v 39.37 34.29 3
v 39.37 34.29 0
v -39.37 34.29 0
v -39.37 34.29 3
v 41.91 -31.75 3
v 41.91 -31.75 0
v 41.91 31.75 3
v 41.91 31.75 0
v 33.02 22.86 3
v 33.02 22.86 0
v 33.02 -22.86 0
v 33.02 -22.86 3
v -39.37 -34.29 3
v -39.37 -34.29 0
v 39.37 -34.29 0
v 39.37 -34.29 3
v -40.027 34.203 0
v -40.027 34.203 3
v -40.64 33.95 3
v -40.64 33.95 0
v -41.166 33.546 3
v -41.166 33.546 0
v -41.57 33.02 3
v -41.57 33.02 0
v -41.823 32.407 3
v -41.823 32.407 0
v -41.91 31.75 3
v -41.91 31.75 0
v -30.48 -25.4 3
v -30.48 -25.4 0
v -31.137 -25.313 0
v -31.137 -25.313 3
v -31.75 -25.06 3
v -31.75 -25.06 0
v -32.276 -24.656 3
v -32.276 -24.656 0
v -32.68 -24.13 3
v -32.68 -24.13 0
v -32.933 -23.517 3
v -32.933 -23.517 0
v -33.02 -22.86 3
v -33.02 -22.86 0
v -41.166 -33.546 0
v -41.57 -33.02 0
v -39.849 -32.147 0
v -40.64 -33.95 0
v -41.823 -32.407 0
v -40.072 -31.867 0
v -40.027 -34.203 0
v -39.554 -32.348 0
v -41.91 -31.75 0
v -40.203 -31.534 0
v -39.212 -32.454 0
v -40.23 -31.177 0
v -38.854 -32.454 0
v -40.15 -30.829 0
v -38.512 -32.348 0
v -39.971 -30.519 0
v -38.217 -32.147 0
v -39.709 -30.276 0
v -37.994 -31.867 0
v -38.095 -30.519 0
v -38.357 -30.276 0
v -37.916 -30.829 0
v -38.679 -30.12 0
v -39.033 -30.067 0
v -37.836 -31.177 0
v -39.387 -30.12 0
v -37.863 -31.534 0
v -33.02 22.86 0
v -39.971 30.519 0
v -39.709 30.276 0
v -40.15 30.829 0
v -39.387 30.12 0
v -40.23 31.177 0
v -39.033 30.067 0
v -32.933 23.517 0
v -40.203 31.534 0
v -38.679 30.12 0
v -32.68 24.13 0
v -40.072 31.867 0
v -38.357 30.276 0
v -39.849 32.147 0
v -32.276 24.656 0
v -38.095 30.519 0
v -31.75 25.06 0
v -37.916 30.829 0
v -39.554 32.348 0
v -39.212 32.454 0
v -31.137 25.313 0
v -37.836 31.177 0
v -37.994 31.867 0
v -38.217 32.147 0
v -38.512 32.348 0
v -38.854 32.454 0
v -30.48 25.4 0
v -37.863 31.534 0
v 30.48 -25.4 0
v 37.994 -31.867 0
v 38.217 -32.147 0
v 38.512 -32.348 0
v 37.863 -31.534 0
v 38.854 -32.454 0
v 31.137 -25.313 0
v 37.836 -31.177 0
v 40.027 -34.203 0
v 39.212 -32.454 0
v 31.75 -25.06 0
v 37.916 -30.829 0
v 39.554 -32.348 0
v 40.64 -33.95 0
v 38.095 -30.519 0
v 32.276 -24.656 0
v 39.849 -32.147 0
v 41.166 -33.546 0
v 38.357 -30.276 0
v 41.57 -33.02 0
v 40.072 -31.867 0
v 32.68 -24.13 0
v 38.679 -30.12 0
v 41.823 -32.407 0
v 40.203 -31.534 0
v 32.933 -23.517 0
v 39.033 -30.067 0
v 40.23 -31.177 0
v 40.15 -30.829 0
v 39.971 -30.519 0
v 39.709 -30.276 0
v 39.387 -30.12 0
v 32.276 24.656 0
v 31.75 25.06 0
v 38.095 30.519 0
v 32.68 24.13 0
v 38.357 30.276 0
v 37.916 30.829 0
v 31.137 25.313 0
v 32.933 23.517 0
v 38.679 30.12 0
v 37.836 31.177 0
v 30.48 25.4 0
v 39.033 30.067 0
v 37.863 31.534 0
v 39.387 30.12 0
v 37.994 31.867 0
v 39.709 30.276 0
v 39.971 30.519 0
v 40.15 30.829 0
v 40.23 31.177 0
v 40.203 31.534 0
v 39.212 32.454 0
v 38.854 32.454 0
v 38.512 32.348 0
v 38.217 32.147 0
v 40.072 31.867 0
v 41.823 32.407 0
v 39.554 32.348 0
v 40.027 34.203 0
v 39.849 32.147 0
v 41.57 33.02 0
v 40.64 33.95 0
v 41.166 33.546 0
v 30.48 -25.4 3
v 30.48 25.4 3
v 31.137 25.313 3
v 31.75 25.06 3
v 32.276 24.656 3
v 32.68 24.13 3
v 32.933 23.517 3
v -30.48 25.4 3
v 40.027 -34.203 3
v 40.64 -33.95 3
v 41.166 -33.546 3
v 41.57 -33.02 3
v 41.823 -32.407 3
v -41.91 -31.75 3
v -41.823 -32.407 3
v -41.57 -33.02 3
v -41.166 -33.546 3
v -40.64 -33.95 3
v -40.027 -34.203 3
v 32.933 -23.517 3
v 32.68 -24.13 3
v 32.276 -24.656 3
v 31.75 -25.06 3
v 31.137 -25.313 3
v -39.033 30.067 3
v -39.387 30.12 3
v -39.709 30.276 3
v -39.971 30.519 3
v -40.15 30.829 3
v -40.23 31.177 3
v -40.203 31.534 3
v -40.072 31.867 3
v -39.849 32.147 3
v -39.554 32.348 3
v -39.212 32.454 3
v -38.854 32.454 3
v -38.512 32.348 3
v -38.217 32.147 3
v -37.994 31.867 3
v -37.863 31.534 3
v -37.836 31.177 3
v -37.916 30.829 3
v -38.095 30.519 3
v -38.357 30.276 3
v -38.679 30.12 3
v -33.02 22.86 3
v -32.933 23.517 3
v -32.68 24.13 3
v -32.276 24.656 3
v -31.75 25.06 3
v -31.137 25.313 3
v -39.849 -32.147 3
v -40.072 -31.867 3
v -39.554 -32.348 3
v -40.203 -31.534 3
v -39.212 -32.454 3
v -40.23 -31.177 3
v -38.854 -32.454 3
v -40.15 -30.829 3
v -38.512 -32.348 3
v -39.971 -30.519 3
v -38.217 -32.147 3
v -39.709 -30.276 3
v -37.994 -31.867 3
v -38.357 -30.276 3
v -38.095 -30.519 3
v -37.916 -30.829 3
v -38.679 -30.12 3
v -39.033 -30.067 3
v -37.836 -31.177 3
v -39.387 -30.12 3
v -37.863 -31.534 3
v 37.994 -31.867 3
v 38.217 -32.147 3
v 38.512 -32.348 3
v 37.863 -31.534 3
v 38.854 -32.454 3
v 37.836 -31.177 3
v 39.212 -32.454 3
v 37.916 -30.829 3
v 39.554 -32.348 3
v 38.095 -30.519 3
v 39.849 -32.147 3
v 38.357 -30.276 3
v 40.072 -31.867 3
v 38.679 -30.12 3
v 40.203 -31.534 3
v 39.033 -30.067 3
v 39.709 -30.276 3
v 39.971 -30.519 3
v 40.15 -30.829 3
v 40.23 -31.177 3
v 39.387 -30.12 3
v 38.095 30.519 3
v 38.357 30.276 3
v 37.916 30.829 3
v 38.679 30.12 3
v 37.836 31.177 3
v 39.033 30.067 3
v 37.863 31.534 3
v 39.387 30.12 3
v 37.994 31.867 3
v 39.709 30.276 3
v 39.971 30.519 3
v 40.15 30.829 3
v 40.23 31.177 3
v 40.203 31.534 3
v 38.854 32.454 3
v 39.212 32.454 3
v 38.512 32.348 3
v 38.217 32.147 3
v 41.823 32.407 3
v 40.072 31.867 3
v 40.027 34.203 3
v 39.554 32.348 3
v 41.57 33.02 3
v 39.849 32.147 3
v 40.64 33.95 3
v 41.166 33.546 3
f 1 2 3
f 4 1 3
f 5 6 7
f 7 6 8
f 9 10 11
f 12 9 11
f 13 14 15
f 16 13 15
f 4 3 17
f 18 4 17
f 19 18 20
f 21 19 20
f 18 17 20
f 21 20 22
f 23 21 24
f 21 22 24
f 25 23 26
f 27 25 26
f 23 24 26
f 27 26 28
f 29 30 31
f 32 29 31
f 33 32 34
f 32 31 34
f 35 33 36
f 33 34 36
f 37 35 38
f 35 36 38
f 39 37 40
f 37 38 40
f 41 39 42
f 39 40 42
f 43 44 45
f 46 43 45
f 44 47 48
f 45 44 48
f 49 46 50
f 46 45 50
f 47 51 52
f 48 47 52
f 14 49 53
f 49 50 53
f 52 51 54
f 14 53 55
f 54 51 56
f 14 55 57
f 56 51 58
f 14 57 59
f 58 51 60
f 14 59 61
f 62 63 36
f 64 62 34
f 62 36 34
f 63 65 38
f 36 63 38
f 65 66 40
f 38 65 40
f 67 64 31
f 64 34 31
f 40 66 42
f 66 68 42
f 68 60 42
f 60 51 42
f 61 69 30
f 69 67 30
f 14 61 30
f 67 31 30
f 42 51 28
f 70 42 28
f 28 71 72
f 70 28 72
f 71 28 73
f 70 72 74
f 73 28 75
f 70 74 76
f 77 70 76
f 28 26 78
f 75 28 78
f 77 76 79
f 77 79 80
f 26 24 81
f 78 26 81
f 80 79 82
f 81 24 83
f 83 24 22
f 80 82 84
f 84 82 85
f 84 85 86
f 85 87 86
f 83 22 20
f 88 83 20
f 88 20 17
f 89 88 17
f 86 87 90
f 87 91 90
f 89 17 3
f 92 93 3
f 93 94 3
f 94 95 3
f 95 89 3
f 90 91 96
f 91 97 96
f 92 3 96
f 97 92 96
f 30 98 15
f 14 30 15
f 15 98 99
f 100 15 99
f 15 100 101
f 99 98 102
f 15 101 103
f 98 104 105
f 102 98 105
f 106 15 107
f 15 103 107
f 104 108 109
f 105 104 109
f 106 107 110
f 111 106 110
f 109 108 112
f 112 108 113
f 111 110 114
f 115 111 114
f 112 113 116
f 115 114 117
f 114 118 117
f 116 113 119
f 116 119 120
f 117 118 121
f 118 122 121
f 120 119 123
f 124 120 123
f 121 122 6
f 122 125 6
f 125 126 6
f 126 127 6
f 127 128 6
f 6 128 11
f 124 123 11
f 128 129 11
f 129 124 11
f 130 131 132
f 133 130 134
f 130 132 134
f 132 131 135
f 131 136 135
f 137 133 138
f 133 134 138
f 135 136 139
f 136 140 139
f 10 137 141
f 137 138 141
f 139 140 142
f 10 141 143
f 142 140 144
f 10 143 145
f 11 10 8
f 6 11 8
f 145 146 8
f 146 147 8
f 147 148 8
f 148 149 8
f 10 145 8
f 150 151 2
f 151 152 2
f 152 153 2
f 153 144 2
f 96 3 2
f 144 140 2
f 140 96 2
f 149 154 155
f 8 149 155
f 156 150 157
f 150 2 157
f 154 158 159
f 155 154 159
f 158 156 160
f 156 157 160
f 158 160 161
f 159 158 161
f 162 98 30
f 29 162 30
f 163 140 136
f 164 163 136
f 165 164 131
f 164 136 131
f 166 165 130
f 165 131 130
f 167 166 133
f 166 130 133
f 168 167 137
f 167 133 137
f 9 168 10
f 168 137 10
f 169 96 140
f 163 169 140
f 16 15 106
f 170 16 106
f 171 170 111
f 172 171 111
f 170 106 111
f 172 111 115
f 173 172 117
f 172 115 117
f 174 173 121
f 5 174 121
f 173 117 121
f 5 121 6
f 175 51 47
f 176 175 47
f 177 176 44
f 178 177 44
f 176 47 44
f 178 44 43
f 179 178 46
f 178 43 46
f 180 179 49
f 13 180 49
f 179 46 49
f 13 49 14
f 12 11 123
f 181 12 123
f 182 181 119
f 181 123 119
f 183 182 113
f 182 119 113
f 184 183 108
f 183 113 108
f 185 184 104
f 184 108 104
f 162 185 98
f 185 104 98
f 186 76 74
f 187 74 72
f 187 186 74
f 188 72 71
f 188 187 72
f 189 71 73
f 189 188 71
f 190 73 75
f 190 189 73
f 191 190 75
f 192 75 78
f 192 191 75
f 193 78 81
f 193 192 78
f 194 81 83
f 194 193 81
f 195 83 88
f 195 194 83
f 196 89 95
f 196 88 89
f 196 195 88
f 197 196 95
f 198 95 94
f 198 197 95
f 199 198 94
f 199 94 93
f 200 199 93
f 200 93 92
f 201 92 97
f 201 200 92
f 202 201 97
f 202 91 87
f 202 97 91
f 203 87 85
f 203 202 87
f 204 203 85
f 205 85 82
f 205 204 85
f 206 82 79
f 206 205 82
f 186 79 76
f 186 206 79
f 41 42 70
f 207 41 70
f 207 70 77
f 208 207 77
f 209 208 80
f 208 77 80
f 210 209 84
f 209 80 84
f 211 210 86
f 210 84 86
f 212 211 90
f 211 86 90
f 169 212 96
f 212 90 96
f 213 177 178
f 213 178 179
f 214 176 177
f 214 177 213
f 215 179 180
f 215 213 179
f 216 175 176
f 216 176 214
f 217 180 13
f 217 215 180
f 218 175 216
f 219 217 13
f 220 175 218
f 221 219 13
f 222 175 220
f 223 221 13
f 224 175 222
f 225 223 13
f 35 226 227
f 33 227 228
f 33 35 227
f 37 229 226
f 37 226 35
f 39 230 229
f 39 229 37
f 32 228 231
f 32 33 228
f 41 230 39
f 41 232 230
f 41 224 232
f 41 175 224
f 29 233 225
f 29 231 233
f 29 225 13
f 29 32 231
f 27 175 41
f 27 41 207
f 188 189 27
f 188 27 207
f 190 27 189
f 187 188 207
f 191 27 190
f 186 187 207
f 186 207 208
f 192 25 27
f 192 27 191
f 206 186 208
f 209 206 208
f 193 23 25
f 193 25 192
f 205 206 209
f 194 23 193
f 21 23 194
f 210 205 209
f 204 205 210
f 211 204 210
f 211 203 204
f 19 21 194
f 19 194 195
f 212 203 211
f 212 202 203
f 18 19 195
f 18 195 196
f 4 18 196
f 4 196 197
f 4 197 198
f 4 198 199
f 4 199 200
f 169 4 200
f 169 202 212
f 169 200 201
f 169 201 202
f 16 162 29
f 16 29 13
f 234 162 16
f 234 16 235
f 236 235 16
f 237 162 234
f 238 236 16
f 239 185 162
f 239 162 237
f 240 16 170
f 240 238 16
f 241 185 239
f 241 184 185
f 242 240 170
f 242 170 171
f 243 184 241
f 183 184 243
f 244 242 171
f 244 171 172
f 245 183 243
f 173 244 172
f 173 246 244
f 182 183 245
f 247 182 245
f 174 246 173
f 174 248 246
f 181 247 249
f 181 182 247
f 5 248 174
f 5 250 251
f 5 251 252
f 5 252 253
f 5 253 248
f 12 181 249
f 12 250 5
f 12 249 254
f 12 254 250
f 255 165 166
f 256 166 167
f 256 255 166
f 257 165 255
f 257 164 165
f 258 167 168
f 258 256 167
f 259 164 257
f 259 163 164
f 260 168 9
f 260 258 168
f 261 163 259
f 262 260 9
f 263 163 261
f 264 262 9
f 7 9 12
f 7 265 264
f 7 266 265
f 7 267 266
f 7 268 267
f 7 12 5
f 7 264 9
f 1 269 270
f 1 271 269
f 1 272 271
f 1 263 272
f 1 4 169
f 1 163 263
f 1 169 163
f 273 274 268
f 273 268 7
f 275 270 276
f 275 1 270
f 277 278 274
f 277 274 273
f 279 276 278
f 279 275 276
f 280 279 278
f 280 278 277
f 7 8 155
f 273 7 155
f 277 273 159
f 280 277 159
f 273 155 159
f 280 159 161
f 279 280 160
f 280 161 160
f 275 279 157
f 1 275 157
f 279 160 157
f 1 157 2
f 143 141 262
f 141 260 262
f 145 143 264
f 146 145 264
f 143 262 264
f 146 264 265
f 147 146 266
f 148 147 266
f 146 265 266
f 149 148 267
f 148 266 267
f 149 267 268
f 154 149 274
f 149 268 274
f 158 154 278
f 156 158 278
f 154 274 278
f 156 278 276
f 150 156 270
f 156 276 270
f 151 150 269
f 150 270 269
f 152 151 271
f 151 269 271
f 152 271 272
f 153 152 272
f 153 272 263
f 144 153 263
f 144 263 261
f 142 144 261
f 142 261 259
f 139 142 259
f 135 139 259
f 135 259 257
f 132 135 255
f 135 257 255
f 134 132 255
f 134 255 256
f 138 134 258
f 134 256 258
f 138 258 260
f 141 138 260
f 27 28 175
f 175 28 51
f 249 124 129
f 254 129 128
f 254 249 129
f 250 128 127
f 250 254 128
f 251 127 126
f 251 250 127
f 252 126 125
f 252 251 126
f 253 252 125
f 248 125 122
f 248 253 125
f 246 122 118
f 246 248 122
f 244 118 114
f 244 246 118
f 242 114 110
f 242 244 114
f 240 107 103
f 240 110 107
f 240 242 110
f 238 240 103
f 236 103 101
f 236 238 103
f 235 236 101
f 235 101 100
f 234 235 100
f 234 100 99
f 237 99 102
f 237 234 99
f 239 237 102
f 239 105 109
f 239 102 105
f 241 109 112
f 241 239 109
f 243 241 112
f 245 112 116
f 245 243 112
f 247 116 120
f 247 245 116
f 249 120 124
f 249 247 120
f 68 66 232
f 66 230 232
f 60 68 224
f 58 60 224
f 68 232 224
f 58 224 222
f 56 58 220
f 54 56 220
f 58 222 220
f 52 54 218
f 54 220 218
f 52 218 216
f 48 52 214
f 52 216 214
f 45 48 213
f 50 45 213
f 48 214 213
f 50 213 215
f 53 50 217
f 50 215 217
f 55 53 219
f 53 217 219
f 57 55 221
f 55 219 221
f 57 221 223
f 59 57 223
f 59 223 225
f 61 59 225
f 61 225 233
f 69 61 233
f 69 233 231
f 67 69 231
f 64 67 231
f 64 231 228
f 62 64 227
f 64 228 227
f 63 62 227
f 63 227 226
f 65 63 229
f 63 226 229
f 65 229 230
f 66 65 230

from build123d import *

# Parameters (mm, degrees)
BOSS_EXTRUDE1_DEPTH = 3


with BuildPart() as part:
    # Sketch1 → Boss-Extrude1 (new body)
    with BuildSketch(Plane.XY):
        with BuildLine():
            Line((39.37, 34.29), (-39.37, 34.29))
            ThreePointArc((-39.37, 34.29), (-41.166051224, 33.546051224), (-41.91, 31.75))
            Line((-41.91, 31.75), (-41.91, -31.75))
            ThreePointArc((-41.91, -31.75), (-41.166051224, -33.546051224), (-39.37, -34.29))
            Line((-39.37, -34.29), (39.37, -34.29))
            ThreePointArc((39.37, -34.29), (41.166051224, -33.546051224), (41.91, -31.75))
            Line((41.91, -31.75), (41.91, 31.75))
            ThreePointArc((41.91, 31.75), (41.166051224, 33.546051224), (39.37, 34.29))
        make_face()
        with BuildLine():
            Line((-30.48, 25.4), (30.48, 25.4))
            ThreePointArc((30.48, 25.4), (32.276051224, 24.656051224), (33.02, 22.86))
            Line((33.02, 22.86), (33.02, -22.86))
            ThreePointArc((33.02, -22.86), (32.276051224, -24.656051224), (30.48, -25.4))
            Line((30.48, -25.4), (-30.48, -25.4))
            ThreePointArc((-30.48, -25.4), (-32.276051224, -24.656051224), (-33.02, -22.86))
            Line((-33.02, -22.86), (-33.02, 22.86))
            ThreePointArc((-33.02, 22.86), (-32.276051224, 24.656051224), (-30.48, 25.4))
        make_face(mode=Mode.SUBTRACT)
    extrude(amount=BOSS_EXTRUDE1_DEPTH)

    # Sketch3 → M2 Clearance Hole1 (revolve, cut)
    with BuildSketch(Plane(origin=(-39.033101712, 31.267063068, 3), x_dir=(0, -1, 0), z_dir=(1, 0, 0))):
        Polygon((0, 0), (0, 3.769032743), (1.2, 3.048), (1.2, 0), align=None)
    m2_clearance_hole1 = revolve(axis=Axis((-39.033101712, 31.267063068, 9.35), (0, 0, -1)), mode=Mode.SUBTRACT)

    # Mirror1: M2 Clearance Hole1 across plane
    add(m2_clearance_hole1.mirror(Plane.ZX), mode=Mode.SUBTRACT)

    # Mirror2: M2 Clearance Hole1 across plane
    add(m2_clearance_hole1.mirror(Plane(origin=(0, 0, 0), x_dir=(0, 0, 1), z_dir=(1, 0, 0))), mode=Mode.SUBTRACT)

    # Mirror2 copy 1 sketch → Mirror2 copy 1 (revolve, cut)
    with BuildSketch(Plane(origin=(39.033101712, -31.267063068, 3), x_dir=(0, 1, 0), z_dir=(-1, 0, 0))):
        Polygon((0, 0), (0, 3.769032743), (1.2, 3.048), (1.2, 0), align=None)
    revolve(axis=Axis((39.033101712, -31.267063068, 9.35), (0, 0, -1)), mode=Mode.SUBTRACT)


solid = part.part
